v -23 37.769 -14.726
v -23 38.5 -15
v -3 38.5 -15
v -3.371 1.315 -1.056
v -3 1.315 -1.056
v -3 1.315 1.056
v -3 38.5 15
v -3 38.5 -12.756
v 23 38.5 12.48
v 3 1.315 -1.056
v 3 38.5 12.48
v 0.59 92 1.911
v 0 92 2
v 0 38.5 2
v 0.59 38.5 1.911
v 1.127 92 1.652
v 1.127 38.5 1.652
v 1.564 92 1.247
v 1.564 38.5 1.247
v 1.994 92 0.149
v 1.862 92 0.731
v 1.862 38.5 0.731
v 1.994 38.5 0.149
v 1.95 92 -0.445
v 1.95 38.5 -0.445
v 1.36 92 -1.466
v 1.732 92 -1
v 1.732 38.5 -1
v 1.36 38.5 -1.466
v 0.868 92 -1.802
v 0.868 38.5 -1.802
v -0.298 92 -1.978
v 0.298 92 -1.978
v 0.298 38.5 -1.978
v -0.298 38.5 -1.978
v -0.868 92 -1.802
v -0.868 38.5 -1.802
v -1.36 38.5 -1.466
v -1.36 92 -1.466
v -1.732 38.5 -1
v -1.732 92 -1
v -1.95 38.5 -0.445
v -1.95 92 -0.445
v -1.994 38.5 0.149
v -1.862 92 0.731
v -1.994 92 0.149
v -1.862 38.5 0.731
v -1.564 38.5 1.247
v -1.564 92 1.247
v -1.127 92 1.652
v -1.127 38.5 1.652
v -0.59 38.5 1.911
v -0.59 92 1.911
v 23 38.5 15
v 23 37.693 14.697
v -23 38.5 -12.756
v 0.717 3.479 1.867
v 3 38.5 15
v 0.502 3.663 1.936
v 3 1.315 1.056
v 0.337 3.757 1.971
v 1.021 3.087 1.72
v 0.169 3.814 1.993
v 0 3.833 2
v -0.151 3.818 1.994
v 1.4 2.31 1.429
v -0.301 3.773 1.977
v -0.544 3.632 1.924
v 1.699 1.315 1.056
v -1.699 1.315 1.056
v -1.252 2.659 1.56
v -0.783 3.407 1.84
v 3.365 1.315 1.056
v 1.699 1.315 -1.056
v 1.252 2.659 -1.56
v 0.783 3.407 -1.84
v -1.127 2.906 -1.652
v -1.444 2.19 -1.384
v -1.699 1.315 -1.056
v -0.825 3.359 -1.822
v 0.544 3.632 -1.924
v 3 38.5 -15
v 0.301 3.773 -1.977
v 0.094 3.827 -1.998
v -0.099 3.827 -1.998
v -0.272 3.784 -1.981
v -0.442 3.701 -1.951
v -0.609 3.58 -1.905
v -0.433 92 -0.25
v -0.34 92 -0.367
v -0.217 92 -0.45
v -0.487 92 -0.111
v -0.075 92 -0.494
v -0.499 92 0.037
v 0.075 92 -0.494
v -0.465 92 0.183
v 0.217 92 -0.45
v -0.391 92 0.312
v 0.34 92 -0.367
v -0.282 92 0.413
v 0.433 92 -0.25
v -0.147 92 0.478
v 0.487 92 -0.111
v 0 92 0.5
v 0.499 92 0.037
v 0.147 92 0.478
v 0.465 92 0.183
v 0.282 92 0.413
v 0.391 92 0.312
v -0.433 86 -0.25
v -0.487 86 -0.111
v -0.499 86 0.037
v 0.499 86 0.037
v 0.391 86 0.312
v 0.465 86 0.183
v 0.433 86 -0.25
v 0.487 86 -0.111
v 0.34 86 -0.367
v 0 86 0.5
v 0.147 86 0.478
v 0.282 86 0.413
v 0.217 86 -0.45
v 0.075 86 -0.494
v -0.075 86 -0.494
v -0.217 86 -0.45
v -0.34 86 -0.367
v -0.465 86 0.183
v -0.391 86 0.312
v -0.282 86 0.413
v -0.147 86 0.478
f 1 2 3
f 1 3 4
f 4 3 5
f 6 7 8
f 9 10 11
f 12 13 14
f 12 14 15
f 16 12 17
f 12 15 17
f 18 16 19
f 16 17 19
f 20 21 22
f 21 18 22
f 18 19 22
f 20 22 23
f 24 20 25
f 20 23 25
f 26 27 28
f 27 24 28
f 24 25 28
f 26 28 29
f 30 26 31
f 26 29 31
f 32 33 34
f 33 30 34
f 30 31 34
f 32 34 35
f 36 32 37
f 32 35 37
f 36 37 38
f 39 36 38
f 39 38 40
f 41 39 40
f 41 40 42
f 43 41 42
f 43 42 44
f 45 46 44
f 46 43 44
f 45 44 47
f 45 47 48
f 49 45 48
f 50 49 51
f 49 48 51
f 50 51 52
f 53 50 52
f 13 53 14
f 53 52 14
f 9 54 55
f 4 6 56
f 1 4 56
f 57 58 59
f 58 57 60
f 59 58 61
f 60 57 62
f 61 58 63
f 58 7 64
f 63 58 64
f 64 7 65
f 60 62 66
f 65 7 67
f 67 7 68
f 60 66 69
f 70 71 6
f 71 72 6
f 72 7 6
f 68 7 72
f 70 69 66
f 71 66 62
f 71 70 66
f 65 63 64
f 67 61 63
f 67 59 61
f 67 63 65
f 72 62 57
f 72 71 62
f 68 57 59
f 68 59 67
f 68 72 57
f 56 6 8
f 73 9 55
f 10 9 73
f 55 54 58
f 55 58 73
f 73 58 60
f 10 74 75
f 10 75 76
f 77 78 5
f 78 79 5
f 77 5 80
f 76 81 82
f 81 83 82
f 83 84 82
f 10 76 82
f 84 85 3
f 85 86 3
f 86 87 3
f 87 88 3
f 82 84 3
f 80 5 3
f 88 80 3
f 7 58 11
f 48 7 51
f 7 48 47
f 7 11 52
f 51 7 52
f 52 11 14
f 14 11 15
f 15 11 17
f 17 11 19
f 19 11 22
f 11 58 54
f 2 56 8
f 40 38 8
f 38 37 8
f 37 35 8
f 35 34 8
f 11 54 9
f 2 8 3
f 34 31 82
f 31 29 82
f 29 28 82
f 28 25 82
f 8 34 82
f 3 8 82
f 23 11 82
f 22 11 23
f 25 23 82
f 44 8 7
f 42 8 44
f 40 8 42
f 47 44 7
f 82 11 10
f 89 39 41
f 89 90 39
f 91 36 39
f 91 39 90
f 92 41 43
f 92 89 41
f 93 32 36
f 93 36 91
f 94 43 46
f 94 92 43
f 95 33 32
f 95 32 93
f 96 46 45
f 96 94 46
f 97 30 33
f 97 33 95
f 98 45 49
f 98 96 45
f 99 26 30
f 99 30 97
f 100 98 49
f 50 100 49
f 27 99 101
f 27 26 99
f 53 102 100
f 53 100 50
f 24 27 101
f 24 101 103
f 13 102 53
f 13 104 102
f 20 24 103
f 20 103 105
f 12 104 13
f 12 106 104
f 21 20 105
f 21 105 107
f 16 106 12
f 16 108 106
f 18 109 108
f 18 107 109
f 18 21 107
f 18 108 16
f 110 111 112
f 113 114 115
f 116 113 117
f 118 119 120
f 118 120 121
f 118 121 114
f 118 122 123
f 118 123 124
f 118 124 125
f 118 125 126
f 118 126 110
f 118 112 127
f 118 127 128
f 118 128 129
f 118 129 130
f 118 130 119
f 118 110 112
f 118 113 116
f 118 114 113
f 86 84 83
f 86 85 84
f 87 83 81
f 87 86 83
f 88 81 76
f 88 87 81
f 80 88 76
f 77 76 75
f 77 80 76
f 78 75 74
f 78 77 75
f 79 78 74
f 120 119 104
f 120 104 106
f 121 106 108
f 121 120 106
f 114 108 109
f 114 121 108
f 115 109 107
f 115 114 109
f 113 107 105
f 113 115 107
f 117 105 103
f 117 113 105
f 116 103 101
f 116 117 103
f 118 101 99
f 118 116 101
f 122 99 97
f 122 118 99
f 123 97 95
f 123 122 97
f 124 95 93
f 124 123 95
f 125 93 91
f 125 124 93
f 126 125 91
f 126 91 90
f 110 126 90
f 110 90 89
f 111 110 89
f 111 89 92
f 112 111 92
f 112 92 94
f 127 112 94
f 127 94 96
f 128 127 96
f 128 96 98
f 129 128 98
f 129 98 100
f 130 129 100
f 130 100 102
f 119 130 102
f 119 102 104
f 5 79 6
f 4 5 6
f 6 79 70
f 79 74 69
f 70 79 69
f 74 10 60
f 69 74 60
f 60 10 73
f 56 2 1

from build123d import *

# Parameters (mm, degrees)
SKETCH_1_R               = 0.5
EXTRUDE_1_DEPTH          = 92
SHELL_1_T                = 1.5
EXTRUDE_2_OUTLINE_R      = 0.5
EXTRUDE_2_DEPTH          = 86
EXTRUDE_4_DEPTH          = 3
EXTRUDE_4_DEPTH_BACK     = 3
CUT_EXTRUDE_1_DEPTH      = 3
CUT_EXTRUDE_1_DEPTH_BACK = 3
CUT_EXTRUDE_2_DEPTH      = 10
CUT_EXTRUDE_2_DEPTH_BACK = 10
EXTRUDE_6_DEPTH          = 20
CUT_EXTRUDE_6_DEPTH      = 15
EXTRUDE_7_DEPTH          = 20
CUT_EXTRUDE_7_DEPTH      = 20


# Read off the part's stored shape, not the designer's step: 凸台-拉伸2
with BuildPart() as part:
    # 草图1 → 凸台-拉伸1 (new body)
    with BuildSketch(Plane(origin=(0, 0, 0), x_dir=(1, 0, 0), z_dir=(0, 1, 0))):
        with Locations(Location((0, 0, 0), (0, 0, 270))):
            Circle(SKETCH_1_R)
    extrude(amount=EXTRUDE_1_DEPTH)

    # 抽壳1
    shell_1_openings = [part.faces().sort_by_distance(p)[0] for p in [
        (0, 92, 0),
    ]]
    offset(amount=SHELL_1_T, openings=shell_1_openings, kind=Kind.INTERSECTION)

    # 凸台-拉伸2 outline → 凸台-拉伸2 (add)
    with BuildSketch(Plane(origin=(0, 0, 0), x_dir=(1, 0, 0), z_dir=(0, 1, 0))):
        Circle(EXTRUDE_2_OUTLINE_R)
    extrude(amount=EXTRUDE_2_DEPTH)

    # 草图5 → 凸台-拉伸4 (add, two sides: drawn at the far end of the back side and taken through both)
    with BuildSketch(Plane(origin=(0, 0, 0), x_dir=(0, 0, -1), z_dir=(1, 0, 0)).offset(-EXTRUDE_4_DEPTH_BACK)):
        Polygon((0, 38.5), (-15, 38.5), (0, -1.5), (15, 38.5), align=None)
    extrude(amount=EXTRUDE_4_DEPTH + EXTRUDE_4_DEPTH_BACK)

    # 草图6 → 切除-拉伸1 (cut, two sides: drawn at the far end of the back side and taken through both)
    with BuildSketch(Plane(origin=(0, 0, 0), x_dir=(0, 0, -1), z_dir=(1, 0, 0)).offset(-CUT_EXTRUDE_1_DEPTH_BACK)):
        Polygon((-2.867091748, -1.5), (0, -1.5), (-2.867091748, 6.145577994), align=None)
        Polygon((0, -1.5), (2.807839657, -1.5), (2.807839657, 5.987572419), align=None)
    extrude(amount=CUT_EXTRUDE_1_DEPTH + CUT_EXTRUDE_1_DEPTH_BACK, mode=Mode.SUBTRACT)

    # 草图8 → 切除-拉伸2 (cut, two sides: drawn at the far end of the back side and taken through both)
    with BuildSketch(Plane(origin=(0, 0, 0), x_dir=(0, 0, -1), z_dir=(1, 0, 0)).offset(-CUT_EXTRUDE_2_DEPTH_BACK)):
        Polygon((0, -1.5), (-1.055736005, 1.315296012), (1.055736005, 1.315296012), align=None)
    extrude(amount=CUT_EXTRUDE_2_DEPTH + CUT_EXTRUDE_2_DEPTH_BACK, mode=Mode.SUBTRACT)

    # 草图12 → 凸台-拉伸6 (add)
    with BuildSketch(Plane(origin=(3, 0, 0), x_dir=(0, 0, -1), z_dir=(1, 0, 0))):
        Polygon((1.055736005, 1.315296012), (-12.479805664, 38.5), (-15, 38.5), (-1.055736005, 1.315296012), align=None)
    extrude(amount=EXTRUDE_6_DEPTH)

    # 草图14 → 切除-拉伸6 (cut)
    with BuildSketch(Plane(origin=(0, 0.49322305, -1.354977403), x_dir=(-1, 0, 0), z_dir=(0, 0.3420517460280193, -0.939681117741111))):
        Polygon((-23, 40.446462351), (-3, 0.874842483), (-23, 0.874842483), align=None)
    extrude(amount=-CUT_EXTRUDE_6_DEPTH, mode=Mode.SUBTRACT)

    # 草图15 → 凸台-拉伸7 (add)
    with BuildSketch(Plane.ZY.offset(3)):
        Polygon((1.055736005, 1.315296012), (-12.756487539, 38.5), (-15, 38.5), (-1.055736005, 1.315296012), align=None)
    extrude(amount=EXTRUDE_7_DEPTH)

    # 草图16 → 切除-拉伸7 (cut)
    with BuildSketch(Plane(origin=(0, 0.504079298, 1.357061695), x_dir=(1, 0, 0), z_dir=(0, 0.3482034119031621, 0.9374190012683746))):
        Polygon((-3, 0.865372595), (-23, 40.532484034), (-23, 0.865372595), align=None)
    extrude(amount=-CUT_EXTRUDE_7_DEPTH, mode=Mode.SUBTRACT)


solid = part.part
